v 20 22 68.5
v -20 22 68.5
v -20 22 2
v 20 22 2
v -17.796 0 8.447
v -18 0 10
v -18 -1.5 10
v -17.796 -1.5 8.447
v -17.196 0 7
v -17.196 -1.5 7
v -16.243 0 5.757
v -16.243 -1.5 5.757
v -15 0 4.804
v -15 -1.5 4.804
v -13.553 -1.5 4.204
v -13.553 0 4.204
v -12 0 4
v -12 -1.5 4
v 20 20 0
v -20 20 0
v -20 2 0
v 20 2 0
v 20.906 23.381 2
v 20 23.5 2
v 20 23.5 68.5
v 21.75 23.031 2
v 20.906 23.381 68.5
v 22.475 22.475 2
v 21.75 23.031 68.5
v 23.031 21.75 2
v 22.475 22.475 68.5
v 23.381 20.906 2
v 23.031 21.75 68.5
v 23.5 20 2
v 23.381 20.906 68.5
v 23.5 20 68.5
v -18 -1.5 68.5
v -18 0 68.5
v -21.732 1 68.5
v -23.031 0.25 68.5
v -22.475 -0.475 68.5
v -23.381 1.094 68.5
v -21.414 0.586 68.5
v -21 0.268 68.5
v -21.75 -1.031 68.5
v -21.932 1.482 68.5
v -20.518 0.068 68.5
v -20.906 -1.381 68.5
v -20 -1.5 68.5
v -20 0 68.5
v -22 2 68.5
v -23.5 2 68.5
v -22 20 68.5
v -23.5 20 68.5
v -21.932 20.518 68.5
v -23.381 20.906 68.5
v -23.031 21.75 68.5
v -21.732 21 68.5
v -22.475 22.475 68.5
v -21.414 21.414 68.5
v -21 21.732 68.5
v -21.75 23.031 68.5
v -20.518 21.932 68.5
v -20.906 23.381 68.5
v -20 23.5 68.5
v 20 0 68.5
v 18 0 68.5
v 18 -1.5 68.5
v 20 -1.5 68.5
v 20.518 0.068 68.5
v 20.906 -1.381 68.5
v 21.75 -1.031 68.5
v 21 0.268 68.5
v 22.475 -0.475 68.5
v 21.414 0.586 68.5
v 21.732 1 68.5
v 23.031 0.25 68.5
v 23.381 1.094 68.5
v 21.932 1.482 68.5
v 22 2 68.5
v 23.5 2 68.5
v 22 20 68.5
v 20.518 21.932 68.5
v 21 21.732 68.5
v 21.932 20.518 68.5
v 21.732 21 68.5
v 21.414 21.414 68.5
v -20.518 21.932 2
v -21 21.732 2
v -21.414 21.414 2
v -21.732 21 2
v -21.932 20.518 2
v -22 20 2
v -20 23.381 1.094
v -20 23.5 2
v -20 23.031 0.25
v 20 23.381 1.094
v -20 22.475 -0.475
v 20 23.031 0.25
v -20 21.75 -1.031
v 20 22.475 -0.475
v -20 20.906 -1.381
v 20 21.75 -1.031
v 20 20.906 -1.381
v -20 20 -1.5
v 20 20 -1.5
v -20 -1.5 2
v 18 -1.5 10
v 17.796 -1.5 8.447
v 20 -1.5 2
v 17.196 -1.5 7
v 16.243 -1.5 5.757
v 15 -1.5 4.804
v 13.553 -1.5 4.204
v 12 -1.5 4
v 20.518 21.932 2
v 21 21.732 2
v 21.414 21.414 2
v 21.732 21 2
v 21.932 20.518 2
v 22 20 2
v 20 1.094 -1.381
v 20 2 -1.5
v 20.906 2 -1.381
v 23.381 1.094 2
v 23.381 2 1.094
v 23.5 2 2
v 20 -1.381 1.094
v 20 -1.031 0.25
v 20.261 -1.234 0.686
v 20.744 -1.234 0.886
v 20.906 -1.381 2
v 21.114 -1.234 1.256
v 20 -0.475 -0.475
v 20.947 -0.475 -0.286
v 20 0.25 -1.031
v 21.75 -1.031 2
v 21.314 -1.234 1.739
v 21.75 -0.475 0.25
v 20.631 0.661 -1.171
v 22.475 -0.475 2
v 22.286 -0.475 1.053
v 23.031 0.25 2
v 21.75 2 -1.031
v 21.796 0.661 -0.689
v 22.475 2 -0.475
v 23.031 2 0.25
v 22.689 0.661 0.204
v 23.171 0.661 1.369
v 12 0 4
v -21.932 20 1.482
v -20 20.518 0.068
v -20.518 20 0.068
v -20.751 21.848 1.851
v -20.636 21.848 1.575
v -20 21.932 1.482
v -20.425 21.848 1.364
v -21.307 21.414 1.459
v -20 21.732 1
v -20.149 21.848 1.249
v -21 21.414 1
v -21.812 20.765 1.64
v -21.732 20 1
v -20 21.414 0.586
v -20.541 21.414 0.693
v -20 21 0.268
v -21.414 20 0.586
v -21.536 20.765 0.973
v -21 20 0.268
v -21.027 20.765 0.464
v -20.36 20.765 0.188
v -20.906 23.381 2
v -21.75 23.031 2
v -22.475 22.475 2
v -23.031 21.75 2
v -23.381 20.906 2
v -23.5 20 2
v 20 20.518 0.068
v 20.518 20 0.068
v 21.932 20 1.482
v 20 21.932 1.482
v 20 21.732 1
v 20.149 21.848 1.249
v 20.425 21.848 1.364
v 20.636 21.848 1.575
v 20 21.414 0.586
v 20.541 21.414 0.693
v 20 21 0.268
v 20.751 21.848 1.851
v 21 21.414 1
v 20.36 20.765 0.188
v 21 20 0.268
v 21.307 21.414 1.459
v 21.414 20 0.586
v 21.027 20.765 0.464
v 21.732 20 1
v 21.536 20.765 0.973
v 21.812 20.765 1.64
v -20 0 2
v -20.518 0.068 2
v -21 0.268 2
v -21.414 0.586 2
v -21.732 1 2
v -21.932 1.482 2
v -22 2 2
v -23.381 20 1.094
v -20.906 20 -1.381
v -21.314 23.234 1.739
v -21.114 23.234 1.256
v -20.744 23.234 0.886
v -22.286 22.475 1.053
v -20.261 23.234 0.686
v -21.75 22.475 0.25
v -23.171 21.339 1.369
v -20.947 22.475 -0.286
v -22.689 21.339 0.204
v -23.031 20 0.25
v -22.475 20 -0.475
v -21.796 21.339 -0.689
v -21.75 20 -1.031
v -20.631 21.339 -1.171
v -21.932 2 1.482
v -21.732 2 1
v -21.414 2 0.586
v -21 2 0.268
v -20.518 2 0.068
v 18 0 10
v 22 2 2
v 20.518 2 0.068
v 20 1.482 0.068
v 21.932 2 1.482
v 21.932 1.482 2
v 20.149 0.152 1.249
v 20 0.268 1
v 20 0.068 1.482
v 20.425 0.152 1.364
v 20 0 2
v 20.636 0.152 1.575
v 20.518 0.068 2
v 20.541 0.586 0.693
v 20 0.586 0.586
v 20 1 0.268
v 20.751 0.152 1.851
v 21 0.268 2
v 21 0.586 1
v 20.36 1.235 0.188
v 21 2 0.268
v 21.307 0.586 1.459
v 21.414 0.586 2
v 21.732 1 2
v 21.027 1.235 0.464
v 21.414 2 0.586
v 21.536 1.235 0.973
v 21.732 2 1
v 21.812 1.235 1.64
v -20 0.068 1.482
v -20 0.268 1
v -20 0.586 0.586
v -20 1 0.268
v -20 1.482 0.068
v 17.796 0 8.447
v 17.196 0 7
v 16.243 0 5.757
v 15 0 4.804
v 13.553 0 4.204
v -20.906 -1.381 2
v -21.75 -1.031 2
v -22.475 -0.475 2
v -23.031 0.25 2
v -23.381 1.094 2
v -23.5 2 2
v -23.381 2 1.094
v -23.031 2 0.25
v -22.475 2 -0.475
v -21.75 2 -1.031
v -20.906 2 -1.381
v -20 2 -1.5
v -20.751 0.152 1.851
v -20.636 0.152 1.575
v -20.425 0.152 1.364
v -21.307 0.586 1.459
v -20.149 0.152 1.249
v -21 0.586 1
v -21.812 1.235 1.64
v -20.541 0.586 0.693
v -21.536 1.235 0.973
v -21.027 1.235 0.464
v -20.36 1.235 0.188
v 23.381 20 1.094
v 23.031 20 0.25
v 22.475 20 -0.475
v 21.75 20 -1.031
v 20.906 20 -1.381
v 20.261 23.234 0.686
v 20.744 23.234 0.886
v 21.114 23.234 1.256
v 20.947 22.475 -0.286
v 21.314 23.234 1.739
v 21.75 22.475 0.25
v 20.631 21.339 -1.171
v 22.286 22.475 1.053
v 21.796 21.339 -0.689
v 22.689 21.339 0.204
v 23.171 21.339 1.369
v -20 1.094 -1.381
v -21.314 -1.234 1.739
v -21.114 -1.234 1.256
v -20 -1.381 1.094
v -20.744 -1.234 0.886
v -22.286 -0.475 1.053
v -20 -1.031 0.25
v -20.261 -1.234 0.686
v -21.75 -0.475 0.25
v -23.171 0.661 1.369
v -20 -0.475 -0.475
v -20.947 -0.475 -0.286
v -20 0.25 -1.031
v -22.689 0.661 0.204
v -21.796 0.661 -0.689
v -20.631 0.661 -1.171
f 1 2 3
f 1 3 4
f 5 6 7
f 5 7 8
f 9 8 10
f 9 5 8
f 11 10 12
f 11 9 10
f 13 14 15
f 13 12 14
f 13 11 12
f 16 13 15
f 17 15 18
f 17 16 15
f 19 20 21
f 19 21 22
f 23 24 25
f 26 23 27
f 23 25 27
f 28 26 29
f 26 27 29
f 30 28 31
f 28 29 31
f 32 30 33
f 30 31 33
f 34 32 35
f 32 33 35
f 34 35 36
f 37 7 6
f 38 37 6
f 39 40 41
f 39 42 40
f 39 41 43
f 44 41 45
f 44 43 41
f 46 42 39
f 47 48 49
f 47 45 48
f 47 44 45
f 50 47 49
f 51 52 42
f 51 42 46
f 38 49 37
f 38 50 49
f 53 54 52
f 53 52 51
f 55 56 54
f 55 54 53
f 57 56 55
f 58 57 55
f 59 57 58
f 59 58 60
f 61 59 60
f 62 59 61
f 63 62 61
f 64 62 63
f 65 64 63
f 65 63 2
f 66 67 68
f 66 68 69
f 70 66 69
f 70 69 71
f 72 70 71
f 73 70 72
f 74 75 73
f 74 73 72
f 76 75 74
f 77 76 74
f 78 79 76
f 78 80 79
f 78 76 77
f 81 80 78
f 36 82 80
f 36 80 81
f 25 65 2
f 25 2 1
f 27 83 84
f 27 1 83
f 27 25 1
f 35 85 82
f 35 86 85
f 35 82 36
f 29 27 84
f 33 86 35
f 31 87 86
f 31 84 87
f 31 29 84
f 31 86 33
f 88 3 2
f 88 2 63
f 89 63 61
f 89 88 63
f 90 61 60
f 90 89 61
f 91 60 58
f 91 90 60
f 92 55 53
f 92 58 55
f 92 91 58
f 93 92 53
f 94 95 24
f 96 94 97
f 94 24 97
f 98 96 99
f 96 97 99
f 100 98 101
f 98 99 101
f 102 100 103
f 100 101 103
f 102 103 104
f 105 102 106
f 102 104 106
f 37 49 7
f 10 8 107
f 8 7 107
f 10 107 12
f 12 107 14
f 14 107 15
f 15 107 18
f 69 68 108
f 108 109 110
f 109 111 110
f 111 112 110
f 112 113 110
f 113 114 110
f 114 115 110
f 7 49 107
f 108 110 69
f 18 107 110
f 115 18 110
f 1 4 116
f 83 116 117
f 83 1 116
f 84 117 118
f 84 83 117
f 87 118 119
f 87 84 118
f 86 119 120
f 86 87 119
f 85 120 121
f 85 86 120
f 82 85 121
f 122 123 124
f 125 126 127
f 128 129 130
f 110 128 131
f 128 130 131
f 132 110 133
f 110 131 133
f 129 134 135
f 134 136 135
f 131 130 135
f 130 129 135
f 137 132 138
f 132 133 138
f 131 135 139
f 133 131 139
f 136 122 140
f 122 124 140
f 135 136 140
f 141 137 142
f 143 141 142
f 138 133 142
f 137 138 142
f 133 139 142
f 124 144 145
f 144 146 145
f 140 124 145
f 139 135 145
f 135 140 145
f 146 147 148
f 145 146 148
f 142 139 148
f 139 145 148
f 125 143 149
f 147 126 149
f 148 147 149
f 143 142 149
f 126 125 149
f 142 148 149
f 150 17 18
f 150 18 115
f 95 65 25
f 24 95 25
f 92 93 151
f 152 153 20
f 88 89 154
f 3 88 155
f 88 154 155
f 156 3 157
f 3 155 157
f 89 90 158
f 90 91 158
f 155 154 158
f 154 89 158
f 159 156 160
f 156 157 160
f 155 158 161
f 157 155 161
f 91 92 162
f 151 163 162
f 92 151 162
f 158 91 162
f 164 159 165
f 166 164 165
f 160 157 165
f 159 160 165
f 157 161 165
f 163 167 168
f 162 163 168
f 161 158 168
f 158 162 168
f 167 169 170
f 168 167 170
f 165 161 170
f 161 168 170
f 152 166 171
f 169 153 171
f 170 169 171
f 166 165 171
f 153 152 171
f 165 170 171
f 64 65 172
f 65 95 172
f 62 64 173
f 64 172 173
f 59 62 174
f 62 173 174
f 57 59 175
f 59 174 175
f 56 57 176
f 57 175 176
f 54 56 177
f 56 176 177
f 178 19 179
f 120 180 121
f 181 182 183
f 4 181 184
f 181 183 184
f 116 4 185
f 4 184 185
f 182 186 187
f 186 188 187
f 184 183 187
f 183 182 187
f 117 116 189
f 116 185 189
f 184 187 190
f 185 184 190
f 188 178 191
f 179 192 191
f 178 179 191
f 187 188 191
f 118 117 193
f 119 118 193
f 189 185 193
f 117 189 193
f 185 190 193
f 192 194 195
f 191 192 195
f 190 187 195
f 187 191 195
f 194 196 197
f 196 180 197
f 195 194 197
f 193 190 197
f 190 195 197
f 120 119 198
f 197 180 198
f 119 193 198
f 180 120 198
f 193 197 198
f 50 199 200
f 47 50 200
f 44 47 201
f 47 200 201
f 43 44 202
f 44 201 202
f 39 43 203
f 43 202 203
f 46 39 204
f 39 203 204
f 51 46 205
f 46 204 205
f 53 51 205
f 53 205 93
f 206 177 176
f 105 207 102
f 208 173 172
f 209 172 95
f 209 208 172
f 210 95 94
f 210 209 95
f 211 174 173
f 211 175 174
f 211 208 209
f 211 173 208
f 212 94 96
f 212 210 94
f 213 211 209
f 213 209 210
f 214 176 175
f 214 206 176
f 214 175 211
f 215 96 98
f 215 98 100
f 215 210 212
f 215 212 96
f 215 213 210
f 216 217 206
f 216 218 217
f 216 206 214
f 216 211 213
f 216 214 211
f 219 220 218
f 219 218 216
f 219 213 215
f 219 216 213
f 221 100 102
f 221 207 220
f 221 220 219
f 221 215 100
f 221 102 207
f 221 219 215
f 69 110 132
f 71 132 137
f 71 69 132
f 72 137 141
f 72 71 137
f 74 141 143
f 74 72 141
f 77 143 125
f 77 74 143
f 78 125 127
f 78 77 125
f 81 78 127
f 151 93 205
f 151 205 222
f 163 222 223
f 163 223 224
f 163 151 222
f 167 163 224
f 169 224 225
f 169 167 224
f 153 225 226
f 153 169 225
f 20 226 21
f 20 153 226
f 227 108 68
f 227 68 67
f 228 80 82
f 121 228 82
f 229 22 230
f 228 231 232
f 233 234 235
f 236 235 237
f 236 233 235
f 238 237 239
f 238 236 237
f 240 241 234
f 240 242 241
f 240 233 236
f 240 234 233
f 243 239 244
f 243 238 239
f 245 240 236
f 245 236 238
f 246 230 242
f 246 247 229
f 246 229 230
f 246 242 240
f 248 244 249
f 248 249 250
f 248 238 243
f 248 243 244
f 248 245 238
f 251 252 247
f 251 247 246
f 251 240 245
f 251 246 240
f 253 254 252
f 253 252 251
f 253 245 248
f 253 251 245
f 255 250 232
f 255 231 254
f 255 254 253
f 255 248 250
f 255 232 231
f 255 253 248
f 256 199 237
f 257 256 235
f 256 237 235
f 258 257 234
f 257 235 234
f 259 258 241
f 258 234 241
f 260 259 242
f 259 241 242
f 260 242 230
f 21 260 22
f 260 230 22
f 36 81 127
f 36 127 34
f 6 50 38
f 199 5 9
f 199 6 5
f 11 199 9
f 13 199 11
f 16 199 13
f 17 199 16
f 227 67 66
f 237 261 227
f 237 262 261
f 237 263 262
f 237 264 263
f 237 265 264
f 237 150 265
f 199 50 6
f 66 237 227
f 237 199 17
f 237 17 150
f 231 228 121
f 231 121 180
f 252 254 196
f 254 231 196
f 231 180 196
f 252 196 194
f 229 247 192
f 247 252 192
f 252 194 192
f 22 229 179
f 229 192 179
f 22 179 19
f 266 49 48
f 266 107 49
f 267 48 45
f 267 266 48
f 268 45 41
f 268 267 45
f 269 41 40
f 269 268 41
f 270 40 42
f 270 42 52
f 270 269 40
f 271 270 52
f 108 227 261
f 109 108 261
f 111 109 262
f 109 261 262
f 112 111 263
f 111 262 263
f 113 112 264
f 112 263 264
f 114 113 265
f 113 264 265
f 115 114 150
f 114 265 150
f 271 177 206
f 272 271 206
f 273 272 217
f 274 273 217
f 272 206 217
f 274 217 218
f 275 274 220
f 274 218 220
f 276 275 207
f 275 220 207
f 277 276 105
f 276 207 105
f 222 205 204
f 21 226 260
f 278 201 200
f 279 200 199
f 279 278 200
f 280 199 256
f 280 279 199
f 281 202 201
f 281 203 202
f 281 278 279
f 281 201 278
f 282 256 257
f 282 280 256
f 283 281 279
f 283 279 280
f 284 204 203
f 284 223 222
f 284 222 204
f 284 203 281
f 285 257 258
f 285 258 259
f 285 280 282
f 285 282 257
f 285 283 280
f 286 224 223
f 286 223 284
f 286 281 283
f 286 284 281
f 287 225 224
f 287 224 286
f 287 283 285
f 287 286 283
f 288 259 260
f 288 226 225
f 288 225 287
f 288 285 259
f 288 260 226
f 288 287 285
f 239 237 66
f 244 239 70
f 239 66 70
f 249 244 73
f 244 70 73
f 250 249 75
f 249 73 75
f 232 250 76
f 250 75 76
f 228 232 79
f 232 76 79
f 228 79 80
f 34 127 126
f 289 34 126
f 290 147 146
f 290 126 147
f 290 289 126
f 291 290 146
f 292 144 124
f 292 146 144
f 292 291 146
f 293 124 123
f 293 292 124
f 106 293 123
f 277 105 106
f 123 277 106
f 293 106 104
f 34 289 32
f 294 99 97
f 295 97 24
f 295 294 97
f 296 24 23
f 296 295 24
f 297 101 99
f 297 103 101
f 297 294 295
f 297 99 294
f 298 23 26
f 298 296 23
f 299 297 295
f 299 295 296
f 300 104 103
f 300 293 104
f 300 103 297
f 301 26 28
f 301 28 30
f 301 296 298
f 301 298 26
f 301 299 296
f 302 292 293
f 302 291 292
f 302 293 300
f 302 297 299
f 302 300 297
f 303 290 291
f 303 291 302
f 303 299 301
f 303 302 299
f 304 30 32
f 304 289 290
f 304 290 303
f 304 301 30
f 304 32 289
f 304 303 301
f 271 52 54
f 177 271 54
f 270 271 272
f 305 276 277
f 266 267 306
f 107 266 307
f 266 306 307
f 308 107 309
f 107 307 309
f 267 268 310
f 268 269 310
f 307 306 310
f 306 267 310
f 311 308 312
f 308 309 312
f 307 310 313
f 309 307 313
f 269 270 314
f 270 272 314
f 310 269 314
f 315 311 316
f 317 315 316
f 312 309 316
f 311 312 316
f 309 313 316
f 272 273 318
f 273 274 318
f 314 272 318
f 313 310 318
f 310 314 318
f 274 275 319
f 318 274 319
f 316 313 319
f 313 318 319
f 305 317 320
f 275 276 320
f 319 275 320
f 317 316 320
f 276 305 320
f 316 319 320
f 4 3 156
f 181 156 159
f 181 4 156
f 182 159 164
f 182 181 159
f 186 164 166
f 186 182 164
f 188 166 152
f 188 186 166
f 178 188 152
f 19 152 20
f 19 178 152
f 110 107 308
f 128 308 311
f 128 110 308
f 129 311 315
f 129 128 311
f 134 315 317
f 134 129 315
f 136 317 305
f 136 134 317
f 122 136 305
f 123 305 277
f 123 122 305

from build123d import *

# Parameters (mm, degrees)
BOX002_W     = 36
BOX002_H     = 20.5
BOX002_DEPTH = 70
FILLET004_R  = 6
BOX_W        = 44
BOX_H        = 22
BOX_DEPTH    = 70
FILLET_R     = 2
FILLET005_R  = 2
BOX003_W     = 47
BOX003_H     = 25
BOX003_DEPTH = 70
FILLET006_R  = 3.5
FILLET007_R  = 3.5


with BuildPart() as fillet004:
    # Box002 → Box002 (new body)
    with BuildSketch(Plane(origin=(-18, -10, 4), x_dir=(1, 0, 0), z_dir=(0, 0, 1))):
        with Locations((18, 10.25)):
            Rectangle(BOX002_W, BOX002_H)
    extrude(amount=BOX002_DEPTH)

    # Fillet004
    fillet004_edges = [fillet004.edges().sort_by_distance(p)[0] for p in [
        (-18, 0.25, 4),
        (18, 0.25, 4),
    ]]
    fillet(fillet004_edges, radius=FILLET004_R)


with BuildPart() as fusion:
    # Box → Box (new body)
    with BuildSketch(Plane(origin=(-22, 0, 0), x_dir=(1, 0, 0), z_dir=(0, 0, 1))):
        with Locations((22, 11)):
            Rectangle(BOX_W, BOX_H)
    extrude(amount=BOX_DEPTH)

    # Fillet
    fillet_edges = [fusion.edges().sort_by_distance(p)[0] for p in [
        (-22, 11, 0),
        (22, 11, 0),
    ]]
    fillet(fillet_edges, radius=FILLET_R)

    # Fillet005
    fillet005_edges = [fusion.edges().sort_by_distance(p)[0] for p in [
        (22, 0, 36),
        (22, 22, 36),
    ]]
    fillet(fillet005_edges, radius=FILLET005_R)

    # Fusion: union Fillet004
    add(fillet004.part)


with BuildPart() as cut:
    # Box003 → Box003 (new body)
    with BuildSketch(Plane(origin=(-23.5, -1.5, -1.5), x_dir=(1, 0, 0), z_dir=(0, 0, 1))):
        with Locations((23.5, 12.5)):
            Rectangle(BOX003_W, BOX003_H)
    extrude(amount=BOX003_DEPTH)

    # Fillet006
    fillet006_edges = [cut.edges().sort_by_distance(p)[0] for p in [
        (-23.5, 11, -1.5),
        (23.5, 11, -1.5),
    ]]
    fillet(fillet006_edges, radius=FILLET006_R)

    # Fillet007
    fillet007_edges = [cut.edges().sort_by_distance(p)[0] for p in [
        (0, -1.5, -1.5),
        (0, 23.5, -1.5),
    ]]
    fillet(fillet007_edges, radius=FILLET007_R)

    # Cut: cut Fusion
    add(fusion.part, mode=Mode.SUBTRACT)


solid = cut.part
